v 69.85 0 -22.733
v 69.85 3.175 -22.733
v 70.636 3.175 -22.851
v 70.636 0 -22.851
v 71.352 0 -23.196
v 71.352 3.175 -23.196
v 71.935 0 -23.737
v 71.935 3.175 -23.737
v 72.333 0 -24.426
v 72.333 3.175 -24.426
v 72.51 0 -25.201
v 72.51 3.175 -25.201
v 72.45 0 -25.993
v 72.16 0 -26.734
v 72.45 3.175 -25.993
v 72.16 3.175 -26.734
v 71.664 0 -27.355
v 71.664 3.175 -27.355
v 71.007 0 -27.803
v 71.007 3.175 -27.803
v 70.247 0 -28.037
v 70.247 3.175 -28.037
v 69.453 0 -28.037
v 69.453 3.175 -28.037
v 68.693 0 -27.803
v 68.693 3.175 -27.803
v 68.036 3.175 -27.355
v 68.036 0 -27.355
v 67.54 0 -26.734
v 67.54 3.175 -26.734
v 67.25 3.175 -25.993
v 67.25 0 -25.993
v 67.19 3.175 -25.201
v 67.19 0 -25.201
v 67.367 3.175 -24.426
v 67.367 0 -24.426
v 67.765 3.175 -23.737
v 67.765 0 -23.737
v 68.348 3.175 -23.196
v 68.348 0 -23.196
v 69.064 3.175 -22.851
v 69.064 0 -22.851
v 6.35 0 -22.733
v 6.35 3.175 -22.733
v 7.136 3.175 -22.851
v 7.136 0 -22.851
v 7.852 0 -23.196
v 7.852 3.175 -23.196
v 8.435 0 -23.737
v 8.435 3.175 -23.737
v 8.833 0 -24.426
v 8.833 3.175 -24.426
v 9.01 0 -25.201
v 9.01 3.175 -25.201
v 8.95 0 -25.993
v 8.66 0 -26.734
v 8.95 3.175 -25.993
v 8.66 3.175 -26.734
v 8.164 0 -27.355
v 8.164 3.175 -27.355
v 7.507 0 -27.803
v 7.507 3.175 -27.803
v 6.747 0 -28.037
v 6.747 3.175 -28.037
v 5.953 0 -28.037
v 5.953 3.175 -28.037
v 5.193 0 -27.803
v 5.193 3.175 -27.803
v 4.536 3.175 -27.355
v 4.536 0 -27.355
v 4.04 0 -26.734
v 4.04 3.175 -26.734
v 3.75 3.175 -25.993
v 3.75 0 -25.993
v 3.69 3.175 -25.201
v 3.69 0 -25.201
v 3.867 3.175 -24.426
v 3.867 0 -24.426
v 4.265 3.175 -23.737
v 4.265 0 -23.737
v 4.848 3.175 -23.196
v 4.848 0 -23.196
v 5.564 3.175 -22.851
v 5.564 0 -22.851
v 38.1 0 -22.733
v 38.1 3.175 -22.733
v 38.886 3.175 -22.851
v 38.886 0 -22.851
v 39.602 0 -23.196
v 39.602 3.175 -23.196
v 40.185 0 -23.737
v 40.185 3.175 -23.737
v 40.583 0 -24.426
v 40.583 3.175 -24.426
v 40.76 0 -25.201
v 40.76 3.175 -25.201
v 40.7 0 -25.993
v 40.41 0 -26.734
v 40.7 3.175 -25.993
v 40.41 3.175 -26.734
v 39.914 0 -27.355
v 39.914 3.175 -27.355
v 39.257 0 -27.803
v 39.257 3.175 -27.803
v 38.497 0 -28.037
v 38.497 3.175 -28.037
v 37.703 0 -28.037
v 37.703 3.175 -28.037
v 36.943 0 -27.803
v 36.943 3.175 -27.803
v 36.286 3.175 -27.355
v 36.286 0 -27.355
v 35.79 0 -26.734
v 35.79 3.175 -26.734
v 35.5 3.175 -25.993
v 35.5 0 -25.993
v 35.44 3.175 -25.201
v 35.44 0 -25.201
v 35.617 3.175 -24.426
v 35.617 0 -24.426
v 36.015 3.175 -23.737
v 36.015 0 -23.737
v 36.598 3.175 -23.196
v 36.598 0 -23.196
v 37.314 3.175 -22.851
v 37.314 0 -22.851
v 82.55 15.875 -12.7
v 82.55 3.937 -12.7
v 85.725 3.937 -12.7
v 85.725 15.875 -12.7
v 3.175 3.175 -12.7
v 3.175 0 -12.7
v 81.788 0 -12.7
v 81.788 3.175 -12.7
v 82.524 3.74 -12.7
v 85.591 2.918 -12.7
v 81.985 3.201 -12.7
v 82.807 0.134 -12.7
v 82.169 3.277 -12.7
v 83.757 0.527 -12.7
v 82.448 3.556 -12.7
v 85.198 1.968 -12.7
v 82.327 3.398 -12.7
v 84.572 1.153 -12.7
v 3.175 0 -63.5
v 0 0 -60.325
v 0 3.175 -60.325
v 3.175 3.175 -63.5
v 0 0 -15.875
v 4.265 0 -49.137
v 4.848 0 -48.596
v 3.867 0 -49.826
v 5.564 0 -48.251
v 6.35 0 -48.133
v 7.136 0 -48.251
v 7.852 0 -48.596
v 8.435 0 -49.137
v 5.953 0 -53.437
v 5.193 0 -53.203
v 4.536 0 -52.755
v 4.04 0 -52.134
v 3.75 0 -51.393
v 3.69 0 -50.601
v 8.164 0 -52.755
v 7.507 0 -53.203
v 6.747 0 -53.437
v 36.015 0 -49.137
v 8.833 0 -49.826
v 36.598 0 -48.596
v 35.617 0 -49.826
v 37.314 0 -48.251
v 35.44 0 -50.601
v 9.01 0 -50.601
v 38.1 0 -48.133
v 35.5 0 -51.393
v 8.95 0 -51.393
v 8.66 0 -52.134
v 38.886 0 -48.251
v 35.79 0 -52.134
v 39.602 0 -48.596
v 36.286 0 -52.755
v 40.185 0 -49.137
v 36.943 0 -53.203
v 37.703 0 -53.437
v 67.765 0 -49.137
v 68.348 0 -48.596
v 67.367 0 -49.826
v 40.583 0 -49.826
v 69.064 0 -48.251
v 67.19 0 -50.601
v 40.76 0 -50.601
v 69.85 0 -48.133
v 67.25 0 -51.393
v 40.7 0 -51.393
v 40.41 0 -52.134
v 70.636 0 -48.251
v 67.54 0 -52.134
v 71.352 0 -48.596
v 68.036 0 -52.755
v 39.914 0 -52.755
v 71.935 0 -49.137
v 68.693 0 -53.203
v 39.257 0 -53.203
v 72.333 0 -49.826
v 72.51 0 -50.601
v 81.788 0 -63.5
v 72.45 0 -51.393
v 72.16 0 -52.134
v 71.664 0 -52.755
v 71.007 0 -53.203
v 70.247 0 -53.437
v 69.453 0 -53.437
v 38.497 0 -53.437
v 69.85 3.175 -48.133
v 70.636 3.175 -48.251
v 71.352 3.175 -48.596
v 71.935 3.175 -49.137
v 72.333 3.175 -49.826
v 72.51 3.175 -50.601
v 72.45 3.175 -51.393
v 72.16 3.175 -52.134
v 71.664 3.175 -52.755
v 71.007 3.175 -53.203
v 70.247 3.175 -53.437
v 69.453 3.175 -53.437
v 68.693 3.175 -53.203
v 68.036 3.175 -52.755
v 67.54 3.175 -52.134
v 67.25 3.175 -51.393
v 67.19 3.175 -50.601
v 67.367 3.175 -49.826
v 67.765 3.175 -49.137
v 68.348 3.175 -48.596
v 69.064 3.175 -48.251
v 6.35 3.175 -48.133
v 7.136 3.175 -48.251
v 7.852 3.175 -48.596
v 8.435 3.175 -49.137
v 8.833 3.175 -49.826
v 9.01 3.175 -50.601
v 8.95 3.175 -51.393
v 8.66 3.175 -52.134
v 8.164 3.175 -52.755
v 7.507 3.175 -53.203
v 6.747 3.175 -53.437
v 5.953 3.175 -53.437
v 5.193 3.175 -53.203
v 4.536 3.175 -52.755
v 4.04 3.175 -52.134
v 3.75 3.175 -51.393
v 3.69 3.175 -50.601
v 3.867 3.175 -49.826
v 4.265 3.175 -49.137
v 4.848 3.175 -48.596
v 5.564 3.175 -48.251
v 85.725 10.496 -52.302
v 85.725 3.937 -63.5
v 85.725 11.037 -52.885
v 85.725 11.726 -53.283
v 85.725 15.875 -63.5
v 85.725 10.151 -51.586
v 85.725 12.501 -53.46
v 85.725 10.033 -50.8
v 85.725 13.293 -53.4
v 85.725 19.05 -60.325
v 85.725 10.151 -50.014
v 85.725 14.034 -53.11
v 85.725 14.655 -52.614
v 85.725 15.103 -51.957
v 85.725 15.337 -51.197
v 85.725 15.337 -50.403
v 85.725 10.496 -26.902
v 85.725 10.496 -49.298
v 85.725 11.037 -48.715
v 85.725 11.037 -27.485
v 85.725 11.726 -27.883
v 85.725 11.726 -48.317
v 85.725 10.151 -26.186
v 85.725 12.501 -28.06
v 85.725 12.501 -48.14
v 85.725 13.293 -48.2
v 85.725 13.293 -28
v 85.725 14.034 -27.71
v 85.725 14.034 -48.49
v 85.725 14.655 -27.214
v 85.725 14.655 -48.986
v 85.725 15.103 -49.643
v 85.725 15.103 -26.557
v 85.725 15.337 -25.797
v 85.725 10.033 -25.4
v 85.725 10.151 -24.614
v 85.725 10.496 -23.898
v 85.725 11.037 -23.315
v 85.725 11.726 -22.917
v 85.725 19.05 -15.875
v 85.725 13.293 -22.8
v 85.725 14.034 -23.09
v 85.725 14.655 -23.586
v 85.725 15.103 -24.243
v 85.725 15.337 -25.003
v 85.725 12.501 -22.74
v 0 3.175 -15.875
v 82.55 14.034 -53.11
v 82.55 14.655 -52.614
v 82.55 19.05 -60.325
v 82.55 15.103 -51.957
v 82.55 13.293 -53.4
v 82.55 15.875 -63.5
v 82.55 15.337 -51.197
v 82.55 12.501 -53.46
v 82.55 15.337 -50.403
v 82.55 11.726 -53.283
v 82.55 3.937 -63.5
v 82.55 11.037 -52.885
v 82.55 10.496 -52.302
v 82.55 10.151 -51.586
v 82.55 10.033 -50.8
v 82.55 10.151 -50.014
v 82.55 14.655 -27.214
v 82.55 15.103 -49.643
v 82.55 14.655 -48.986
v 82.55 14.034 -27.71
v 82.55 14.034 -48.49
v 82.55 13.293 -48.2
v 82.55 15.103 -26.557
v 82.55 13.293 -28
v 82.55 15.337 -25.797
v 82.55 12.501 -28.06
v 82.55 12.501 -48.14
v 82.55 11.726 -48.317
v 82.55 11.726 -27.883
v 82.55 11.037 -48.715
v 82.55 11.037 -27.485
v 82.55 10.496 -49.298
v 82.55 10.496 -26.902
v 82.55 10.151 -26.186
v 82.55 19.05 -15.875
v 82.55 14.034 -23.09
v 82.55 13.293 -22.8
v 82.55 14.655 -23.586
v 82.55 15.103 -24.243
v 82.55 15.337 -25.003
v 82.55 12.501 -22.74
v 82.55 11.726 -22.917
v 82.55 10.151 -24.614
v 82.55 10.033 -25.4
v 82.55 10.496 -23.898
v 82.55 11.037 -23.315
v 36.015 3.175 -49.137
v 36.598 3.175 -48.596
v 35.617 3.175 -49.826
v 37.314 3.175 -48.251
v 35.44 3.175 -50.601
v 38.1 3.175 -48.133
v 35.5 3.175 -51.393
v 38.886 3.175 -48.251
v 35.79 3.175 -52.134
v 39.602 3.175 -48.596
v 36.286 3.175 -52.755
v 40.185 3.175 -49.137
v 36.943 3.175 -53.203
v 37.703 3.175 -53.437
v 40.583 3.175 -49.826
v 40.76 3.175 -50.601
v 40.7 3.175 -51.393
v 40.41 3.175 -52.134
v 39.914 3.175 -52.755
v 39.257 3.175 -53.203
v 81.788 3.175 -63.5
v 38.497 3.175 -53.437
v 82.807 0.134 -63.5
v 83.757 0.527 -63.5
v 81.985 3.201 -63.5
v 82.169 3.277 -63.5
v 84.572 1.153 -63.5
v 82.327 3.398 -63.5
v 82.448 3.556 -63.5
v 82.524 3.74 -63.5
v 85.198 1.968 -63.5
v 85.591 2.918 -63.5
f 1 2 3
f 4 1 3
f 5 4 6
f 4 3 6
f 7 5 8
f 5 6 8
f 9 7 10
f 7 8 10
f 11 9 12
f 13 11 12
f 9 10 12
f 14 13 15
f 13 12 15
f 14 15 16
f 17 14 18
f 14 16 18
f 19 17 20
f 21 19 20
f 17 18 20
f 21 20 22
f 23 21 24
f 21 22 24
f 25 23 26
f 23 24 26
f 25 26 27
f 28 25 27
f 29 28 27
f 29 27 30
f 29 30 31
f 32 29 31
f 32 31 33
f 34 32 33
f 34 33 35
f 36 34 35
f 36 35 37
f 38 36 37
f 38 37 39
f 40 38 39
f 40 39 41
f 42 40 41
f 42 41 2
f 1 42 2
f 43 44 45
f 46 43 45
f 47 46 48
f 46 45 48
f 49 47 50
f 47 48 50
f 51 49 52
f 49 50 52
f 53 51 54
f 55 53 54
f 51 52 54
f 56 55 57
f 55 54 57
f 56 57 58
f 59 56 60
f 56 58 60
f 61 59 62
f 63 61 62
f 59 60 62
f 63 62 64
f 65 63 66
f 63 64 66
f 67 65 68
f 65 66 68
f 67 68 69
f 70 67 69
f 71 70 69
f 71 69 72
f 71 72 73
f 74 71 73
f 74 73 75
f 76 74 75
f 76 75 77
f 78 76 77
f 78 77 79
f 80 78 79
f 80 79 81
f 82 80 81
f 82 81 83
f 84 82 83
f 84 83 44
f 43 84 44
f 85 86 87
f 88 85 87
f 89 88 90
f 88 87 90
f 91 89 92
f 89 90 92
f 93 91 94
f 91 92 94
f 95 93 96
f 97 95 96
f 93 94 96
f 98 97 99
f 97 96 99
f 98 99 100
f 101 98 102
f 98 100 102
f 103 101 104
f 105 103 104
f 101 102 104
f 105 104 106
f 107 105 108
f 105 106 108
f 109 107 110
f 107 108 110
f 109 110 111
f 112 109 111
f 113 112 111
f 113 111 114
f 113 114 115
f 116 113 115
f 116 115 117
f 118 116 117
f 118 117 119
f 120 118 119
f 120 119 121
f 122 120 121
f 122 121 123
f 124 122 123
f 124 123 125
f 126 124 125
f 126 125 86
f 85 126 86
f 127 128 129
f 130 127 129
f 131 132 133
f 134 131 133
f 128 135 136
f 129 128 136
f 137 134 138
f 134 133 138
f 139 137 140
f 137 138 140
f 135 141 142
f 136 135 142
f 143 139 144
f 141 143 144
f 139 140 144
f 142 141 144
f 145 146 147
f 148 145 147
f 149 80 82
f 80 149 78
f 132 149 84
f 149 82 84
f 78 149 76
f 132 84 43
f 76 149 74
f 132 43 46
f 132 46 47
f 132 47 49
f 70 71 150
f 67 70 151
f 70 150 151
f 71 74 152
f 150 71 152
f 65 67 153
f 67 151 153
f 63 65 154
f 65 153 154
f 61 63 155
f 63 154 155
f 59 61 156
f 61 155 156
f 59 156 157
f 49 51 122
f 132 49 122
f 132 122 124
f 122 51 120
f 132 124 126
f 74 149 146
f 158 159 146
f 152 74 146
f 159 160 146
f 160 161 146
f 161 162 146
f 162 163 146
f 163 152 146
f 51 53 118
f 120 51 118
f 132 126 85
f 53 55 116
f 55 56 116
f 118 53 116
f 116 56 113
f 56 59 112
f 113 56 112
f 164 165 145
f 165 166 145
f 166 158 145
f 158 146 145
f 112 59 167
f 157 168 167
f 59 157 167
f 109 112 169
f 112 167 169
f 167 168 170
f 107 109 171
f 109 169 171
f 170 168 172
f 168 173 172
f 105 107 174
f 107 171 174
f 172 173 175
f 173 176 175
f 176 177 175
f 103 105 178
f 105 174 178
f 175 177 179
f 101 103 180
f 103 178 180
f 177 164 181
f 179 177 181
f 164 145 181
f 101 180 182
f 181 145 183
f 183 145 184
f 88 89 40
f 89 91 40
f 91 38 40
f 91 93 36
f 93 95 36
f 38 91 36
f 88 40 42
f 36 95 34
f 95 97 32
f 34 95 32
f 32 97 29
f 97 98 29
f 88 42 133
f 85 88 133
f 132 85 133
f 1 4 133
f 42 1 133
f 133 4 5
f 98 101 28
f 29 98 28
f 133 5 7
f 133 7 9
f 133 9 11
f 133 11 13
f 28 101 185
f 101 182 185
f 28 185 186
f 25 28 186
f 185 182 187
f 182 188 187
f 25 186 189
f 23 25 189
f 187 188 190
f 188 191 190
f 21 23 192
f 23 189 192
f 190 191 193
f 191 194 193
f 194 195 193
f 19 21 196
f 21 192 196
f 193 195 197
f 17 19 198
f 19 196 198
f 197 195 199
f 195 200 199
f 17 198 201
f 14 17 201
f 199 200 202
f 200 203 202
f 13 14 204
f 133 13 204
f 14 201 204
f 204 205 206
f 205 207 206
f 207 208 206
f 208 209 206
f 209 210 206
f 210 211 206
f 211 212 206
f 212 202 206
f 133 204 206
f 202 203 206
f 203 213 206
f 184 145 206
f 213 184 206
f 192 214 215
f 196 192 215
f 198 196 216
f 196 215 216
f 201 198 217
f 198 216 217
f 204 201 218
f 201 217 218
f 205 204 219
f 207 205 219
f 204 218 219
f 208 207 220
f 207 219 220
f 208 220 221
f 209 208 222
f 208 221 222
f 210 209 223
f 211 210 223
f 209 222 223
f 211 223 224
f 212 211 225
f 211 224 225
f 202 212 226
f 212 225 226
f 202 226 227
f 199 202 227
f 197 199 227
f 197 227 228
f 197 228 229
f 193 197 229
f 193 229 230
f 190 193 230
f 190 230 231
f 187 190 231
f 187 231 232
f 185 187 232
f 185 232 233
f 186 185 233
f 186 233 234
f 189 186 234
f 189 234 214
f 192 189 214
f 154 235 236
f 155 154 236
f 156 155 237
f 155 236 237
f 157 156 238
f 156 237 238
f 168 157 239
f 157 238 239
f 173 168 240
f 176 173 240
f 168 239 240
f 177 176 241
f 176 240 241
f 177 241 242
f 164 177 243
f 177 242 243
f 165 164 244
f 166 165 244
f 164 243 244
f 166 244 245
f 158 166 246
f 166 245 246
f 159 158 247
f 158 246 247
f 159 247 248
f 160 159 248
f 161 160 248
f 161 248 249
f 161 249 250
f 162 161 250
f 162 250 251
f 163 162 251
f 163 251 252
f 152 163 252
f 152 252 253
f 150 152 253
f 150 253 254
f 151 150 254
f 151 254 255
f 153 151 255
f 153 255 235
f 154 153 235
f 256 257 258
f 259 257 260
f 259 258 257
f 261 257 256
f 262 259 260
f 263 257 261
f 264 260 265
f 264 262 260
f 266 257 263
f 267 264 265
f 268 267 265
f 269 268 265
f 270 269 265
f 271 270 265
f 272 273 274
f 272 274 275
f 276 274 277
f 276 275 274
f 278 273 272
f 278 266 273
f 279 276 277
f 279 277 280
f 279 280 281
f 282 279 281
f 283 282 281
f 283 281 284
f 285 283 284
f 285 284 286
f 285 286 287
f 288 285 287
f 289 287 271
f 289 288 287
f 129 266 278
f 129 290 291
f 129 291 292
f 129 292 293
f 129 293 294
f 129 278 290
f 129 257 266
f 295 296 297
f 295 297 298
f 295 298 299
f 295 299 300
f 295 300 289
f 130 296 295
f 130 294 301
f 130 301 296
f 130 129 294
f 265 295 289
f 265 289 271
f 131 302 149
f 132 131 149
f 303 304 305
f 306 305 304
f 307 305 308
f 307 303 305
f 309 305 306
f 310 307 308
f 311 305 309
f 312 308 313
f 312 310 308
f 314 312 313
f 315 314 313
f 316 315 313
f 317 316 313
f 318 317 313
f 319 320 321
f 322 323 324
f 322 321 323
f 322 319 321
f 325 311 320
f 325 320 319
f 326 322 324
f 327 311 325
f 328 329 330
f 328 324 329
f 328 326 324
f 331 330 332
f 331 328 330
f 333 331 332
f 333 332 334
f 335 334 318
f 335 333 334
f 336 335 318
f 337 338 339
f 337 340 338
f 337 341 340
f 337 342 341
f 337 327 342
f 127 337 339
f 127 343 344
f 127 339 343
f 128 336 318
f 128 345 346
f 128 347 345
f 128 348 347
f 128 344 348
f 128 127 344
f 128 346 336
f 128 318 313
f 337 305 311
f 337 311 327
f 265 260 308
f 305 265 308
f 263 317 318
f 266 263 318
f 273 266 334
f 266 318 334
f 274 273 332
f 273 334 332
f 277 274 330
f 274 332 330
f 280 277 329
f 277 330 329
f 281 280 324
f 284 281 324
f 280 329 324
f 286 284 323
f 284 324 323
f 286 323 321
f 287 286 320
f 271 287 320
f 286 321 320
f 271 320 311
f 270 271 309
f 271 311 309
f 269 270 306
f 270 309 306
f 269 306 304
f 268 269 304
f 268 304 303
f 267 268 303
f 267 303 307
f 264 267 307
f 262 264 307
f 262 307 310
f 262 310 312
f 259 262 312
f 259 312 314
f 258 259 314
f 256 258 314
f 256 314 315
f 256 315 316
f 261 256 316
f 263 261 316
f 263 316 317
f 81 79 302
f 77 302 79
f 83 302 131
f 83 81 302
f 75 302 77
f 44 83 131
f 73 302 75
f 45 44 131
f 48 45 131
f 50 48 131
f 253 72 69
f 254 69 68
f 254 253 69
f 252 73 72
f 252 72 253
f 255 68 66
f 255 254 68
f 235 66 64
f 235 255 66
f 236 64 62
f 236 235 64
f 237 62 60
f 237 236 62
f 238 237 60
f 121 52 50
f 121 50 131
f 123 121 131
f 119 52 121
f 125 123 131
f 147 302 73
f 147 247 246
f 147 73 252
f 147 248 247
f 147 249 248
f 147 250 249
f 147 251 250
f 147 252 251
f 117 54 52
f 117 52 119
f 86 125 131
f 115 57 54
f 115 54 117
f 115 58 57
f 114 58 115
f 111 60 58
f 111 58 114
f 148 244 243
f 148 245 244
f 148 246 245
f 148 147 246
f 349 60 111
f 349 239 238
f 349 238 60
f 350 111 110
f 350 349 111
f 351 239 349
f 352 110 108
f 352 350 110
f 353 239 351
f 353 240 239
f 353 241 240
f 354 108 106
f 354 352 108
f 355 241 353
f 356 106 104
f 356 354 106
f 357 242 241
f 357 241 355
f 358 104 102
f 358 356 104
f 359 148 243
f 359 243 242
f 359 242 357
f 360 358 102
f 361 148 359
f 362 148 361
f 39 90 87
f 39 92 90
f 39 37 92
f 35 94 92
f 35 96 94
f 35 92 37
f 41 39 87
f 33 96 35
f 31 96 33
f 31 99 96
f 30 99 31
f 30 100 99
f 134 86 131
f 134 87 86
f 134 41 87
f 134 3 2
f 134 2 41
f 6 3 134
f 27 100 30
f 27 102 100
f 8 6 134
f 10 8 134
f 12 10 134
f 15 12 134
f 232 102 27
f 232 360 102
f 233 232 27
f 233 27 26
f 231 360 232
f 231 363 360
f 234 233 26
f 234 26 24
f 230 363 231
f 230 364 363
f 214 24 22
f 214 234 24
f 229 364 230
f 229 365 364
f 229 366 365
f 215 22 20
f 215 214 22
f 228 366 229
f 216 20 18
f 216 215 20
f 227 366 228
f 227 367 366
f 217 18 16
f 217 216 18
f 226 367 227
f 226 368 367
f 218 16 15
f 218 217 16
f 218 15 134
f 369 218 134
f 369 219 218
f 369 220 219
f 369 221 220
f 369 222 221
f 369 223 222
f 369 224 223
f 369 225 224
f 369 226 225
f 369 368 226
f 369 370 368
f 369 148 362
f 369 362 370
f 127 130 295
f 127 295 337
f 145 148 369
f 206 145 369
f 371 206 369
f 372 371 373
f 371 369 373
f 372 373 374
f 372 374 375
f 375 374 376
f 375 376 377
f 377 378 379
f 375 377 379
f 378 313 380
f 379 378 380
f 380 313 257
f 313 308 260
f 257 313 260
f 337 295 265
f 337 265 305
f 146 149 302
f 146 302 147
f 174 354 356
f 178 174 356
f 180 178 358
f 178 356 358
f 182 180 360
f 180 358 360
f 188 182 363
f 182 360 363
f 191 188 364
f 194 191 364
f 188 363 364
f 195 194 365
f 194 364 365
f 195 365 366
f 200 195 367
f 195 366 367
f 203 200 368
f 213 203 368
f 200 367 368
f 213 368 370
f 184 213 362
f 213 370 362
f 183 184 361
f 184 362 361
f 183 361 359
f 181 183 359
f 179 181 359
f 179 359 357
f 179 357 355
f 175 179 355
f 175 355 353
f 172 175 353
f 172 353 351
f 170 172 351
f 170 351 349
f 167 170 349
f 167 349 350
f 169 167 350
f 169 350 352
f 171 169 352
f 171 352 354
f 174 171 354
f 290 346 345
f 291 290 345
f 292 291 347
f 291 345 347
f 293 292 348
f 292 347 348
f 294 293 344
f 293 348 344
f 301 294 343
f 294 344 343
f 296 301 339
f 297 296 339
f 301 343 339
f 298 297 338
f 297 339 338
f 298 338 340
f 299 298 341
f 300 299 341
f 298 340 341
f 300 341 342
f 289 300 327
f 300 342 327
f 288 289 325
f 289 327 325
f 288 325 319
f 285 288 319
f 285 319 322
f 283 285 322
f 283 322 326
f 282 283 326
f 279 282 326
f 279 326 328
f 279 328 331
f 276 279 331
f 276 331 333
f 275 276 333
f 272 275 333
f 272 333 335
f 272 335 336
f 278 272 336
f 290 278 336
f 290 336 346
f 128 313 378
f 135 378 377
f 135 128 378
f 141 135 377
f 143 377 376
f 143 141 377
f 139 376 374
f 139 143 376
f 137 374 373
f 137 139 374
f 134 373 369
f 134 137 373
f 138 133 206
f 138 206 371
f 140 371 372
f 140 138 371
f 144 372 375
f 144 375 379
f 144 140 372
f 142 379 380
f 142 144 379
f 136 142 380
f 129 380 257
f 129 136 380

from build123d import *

# Parameters (mm, degrees)
SKETCH1_W               = 81.788
SKETCH1_H               = 63.5
BOSS_EXTRUDE1_DEPTH     = 3.175
EDGE_FLANGE1_DEPTH      = 63.5
SKETCH6_R               = 2.667
CUT_EXTRUDE1_DEPTH      = 108.856577222
SKETCH7_R               = 2.667
CUT_EXTRUDE2_DEPTH      = 106.875658203
CUT_EXTRUDE3_DEPTH      = 108.856577222
CUT_EXTRUDE3_DEPTH_BACK = 108.856577222
SKETCH8_W               = 104.248957023
SKETCH8_H               = 23.686680931
CHAMFER2_SIZE           = 3.175


# Sheet-metal steps are written as plain solids
with BuildPart() as part:
    # Sketch1 → Boss-Extrude1 (new body)
    with BuildSketch(Plane(origin=(0, 0, 0), x_dir=(1, 0, 0), z_dir=(0, 1, 0))):
        with Locations((40.894, 31.75)):
            Rectangle(SKETCH1_W, SKETCH1_H)
    extrude(amount=BOSS_EXTRUDE1_DEPTH)

    # Edge-Flange1 section (across the edge) → Edge-Flange1 (add)
    with BuildSketch(Plane(origin=(82.55, 3.175, 0), x_dir=(-1, 0, 0), z_dir=(0, 0, -1))):
        with BuildLine():
            Line((-3.175, 0.762), (-3.175, 15.875))
            Line((-3.175, 15.875), (0, 15.875))
            Line((0, 15.875), (0, 0.762))
            ThreePointArc((0, 0.762), (0.223184633, 0.223184633), (0.762, 0))
            Line((0.762, 0), (0.762, -3.175))
            ThreePointArc((0.762, -3.175), (-2.021879398, -2.021879398), (-3.175, 0.762))
        make_face()
    extrude(amount=EDGE_FLANGE1_DEPTH)

    # Sketch6 → Cut-Extrude1 (cut, through all)
    with BuildSketch(Plane(origin=(0, 3.175, 0), x_dir=(1, 0, 0), z_dir=(0, 1, 0))):
        with Locations(Location((6.35, 50.8, 0), (0, 0, 270))):
            Circle(SKETCH6_R)
        with Locations(Location((6.35, 25.4, 0), (0, 0, 270))):
            Circle(SKETCH6_R)
        with Locations((6.35, 0)):
            Circle(SKETCH6_R)
        with Locations(Location((69.85, 50.8, 0), (0, 0, 270))):
            Circle(SKETCH6_R)
        with Locations(Location((69.85, 25.4, 0), (0, 0, 270))):
            Circle(SKETCH6_R)
        with Locations((69.85, 0)):
            Circle(SKETCH6_R)
        with Locations(Location((38.1, 50.8, 0), (0, 0, 270))):
            Circle(SKETCH6_R)
        with Locations((38.1, 0)):
            Circle(SKETCH6_R)
        with Locations(Location((38.1, 25.4, 0), (0, 0, 270))):
            Circle(SKETCH6_R)
    extrude(amount=-CUT_EXTRUDE1_DEPTH, mode=Mode.SUBTRACT)

    # Sketch7 → Cut-Extrude2 (cut, through all)
    with BuildSketch(Plane.ZY.offset(-82.55)):
        with Locations(Location((-50.8, 12.7, 0), (0, 0, 270))):
            Circle(SKETCH7_R)
        with Locations(Location((-25.4, 12.7, 0), (0, 0, 270))):
            Circle(SKETCH7_R)
        with Locations((0, 12.7)):
            Circle(SKETCH7_R)
    extrude(amount=-CUT_EXTRUDE2_DEPTH, mode=Mode.SUBTRACT)

    # Sketch8 → Cut-Extrude3 (cut, two sides: drawn at the far end of the back side and taken through both)
    with BuildSketch(Plane(origin=(0, 3.175, 0), x_dir=(1, 0, 0), z_dir=(0, 1, 0)).offset(-CUT_EXTRUDE3_DEPTH_BACK)):
        with Locations((42.695076622, 0.856659535)):
            Rectangle(SKETCH8_W, SKETCH8_H)
    extrude(amount=CUT_EXTRUDE3_DEPTH + CUT_EXTRUDE3_DEPTH_BACK, mode=Mode.SUBTRACT)

    # Chamfer2
    chamfer2_edges = [part.edges().sort_by_distance(p)[0] for p in [
        (84.1375, 19.05, -12.7),
        (0, 1.5875, -12.7),
        (84.1375, 19.05, -63.5),
        (0, 1.5875, -63.5),
    ]]
    chamfer(chamfer2_edges, length=CHAMFER2_SIZE)


solid = part.part
